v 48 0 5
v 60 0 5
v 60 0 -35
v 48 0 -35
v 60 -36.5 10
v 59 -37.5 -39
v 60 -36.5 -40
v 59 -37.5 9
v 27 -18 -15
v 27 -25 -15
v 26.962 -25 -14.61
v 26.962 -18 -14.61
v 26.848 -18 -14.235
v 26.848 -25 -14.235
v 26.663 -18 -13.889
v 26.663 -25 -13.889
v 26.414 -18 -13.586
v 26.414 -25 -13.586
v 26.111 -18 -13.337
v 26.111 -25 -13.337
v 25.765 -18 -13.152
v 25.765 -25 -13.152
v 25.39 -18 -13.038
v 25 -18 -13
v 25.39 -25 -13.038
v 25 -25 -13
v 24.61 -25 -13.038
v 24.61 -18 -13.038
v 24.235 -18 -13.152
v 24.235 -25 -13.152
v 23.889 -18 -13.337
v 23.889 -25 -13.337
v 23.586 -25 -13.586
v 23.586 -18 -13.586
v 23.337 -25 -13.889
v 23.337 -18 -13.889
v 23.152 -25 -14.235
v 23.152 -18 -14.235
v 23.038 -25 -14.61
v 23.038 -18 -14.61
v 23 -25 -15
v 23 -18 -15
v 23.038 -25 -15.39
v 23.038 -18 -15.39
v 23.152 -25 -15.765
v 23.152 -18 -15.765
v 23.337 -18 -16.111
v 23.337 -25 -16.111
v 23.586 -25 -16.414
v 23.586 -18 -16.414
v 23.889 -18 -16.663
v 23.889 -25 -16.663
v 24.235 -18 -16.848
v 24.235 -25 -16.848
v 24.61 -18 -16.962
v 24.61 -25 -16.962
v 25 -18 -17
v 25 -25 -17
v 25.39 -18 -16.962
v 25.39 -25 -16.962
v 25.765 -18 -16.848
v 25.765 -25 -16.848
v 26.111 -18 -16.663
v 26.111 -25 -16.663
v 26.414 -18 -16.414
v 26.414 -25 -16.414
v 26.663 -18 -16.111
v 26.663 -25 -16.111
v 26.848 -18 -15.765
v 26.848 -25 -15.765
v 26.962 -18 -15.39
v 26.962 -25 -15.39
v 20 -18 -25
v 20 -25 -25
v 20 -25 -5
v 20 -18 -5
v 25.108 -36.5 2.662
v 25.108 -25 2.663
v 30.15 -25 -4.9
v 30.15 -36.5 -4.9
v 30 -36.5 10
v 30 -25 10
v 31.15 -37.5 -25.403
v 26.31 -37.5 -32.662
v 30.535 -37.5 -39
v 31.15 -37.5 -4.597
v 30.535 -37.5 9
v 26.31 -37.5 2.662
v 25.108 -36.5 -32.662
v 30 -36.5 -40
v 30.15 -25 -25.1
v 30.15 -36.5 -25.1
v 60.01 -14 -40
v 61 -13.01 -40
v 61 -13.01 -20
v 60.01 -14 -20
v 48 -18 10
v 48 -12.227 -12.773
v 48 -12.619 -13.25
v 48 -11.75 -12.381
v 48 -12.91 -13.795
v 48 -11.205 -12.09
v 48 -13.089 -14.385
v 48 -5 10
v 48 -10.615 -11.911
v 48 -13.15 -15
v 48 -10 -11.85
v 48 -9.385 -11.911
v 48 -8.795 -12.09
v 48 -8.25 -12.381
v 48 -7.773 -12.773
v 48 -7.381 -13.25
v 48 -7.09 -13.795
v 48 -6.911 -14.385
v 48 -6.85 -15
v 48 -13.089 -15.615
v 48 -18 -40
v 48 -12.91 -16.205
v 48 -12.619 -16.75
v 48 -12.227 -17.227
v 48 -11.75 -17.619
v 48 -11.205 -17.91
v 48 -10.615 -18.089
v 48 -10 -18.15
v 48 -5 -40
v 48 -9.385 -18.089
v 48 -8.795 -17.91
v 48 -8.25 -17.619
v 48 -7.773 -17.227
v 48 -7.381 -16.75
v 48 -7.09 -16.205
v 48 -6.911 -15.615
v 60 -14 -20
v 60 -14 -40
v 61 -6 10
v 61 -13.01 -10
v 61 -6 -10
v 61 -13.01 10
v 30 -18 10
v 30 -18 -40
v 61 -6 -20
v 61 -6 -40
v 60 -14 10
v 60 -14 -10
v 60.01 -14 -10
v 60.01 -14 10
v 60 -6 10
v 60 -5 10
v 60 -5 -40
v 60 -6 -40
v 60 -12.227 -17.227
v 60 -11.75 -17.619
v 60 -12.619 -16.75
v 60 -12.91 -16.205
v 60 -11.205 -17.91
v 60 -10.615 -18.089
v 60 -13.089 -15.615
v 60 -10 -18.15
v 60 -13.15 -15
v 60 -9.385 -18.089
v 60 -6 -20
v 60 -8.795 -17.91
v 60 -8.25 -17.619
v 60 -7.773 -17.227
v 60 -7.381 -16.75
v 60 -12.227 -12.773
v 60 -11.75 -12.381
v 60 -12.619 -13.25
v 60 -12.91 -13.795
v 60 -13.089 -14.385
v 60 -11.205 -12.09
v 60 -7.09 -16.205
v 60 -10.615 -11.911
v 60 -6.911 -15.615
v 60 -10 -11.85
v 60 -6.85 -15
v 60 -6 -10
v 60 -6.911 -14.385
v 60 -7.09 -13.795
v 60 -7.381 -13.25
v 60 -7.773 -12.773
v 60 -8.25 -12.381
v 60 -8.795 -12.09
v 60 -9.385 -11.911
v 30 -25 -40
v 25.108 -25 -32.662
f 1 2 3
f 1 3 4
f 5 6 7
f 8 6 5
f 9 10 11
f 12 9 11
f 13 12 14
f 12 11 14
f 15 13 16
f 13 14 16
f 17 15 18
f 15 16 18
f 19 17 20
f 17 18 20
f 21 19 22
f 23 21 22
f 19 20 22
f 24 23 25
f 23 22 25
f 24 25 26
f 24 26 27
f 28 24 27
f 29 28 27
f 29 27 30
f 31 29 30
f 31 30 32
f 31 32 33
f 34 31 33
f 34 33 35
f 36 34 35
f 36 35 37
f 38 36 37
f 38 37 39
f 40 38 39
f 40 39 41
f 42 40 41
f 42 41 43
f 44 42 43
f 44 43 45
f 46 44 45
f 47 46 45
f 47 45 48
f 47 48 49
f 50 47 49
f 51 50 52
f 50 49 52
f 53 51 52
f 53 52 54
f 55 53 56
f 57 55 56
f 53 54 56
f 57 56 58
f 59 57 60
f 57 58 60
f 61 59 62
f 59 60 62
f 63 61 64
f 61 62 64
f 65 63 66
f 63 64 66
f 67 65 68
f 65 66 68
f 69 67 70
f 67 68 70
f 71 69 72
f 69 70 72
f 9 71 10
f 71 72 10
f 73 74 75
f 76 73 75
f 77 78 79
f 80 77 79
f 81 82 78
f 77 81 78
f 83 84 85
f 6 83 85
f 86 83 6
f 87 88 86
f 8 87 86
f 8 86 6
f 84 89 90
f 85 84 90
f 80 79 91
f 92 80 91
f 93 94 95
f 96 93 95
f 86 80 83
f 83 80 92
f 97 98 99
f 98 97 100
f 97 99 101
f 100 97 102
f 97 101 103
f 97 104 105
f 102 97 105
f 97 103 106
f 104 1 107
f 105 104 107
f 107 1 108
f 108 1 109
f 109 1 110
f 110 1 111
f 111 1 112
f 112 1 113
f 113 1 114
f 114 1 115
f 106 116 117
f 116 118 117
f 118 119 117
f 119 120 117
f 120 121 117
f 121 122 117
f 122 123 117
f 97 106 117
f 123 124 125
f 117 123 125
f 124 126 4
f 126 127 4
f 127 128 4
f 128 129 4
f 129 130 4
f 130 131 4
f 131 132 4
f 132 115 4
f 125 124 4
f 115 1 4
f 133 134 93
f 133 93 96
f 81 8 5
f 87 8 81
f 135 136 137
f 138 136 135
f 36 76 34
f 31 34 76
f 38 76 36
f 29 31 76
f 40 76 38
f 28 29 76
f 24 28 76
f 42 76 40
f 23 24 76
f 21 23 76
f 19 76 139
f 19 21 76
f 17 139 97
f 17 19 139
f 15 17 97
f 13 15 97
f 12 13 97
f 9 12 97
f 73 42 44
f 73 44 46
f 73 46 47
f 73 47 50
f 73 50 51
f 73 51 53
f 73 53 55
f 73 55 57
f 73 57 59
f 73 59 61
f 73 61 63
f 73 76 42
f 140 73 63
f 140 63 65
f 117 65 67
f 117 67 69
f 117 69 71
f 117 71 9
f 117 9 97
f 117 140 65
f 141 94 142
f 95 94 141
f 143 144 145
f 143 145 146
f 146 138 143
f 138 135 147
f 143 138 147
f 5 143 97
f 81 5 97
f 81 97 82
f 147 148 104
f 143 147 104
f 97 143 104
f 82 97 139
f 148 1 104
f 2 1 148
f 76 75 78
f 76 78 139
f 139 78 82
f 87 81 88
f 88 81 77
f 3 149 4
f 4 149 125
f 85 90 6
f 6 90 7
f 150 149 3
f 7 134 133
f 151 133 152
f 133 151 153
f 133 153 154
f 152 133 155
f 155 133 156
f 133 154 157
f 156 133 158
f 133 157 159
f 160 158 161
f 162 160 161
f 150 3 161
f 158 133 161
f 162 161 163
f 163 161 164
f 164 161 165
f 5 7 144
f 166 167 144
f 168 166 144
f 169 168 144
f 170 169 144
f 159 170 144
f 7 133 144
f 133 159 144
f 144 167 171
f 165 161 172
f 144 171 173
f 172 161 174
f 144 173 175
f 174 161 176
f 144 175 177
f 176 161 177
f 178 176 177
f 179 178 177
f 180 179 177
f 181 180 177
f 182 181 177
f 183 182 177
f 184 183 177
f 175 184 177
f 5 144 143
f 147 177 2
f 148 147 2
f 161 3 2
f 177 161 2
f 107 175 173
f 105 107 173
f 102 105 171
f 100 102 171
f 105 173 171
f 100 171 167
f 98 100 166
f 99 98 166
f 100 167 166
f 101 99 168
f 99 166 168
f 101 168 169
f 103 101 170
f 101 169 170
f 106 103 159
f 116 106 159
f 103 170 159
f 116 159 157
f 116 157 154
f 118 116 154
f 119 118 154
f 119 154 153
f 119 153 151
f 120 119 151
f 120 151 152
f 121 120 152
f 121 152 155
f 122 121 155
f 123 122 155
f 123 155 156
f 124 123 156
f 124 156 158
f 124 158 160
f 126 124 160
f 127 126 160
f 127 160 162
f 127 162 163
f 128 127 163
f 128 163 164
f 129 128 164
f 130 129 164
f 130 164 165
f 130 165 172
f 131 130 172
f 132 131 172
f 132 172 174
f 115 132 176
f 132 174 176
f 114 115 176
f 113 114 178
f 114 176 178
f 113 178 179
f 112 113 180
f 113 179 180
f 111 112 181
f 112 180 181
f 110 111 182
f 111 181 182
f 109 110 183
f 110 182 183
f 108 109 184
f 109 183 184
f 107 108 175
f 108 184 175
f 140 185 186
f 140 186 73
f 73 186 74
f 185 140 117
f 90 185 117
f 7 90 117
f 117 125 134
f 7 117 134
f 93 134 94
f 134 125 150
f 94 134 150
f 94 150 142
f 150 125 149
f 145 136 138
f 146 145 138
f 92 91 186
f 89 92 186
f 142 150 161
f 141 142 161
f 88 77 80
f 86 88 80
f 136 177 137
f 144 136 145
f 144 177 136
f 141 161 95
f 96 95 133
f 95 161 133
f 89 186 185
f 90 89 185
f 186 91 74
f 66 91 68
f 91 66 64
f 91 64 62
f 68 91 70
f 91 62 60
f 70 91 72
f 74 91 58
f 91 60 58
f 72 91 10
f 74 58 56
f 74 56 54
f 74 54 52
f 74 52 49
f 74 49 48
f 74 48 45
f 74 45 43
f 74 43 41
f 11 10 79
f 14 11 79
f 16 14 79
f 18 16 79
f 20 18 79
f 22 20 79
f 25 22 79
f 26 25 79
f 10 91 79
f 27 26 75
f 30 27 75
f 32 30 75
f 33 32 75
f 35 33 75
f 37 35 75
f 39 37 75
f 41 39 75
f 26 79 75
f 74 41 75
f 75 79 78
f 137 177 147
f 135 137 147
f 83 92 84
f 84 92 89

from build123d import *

# Parameters (mm, degrees)
SKETCH047_R     = 2
PAD012_DEPTH    = 25
SKETCH048_R     = 3.15
POCKET030_DEPTH = 40.001
SKETCH049_W     = 28
SKETCH049_H     = 50
POCKET031_DEPTH = 18
PAD013_DEPTH    = 12.5
SKETCH051_W     = 20
SKETCH051_H     = 8
PAD014_DEPTH    = 1
CHAMFER009_SIZE = 0.99
CHAMFER010_SIZE = 1
CHAMFER011_SIZE = 5


with BuildPart() as part:
    # Sketch047 → Pad012 (new body)
    with BuildSketch(Plane.XZ):
        Polygon((0, 0), (-30, 0), (-40, 15), (-40, 35), (-30, 50), (0, 50), align=None)
        with Locations((-35, 25)):
            Circle(SKETCH047_R, mode=Mode.SUBTRACT)
    extrude(amount=-PAD012_DEPTH)

    # Sketch048 (on Face6 of Pad012) → Pocket030 (cut, through all)
    with BuildSketch(Plane(origin=(0, 0, 0), x_dir=(0, 0, 1), z_dir=(1, 0, 0))):
        with Locations((25, -15)):
            Circle(SKETCH048_R)
    extrude(amount=-POCKET030_DEPTH, mode=Mode.SUBTRACT)

    # Sketch049 (on Face5 of Pocket030) → Pocket031 (cut)
    with BuildSketch(Plane(origin=(0, 25, 0), x_dir=(1, 0, 0), z_dir=(0, 1, 0))):
        with Locations((-26, -25)):
            Rectangle(SKETCH049_W, SKETCH049_H)
    extrude(amount=-POCKET031_DEPTH, mode=Mode.SUBTRACT)

    # Sketch050 (on Face2 of Pocket031) → Pad013 (join)
    with BuildSketch(Plane.XZ):
        Polygon((-34.891667, 42.6625), (-29.85, 35.1), (-29.85, 14.9), (-34.891667, 7.3375), (-30, 0), (0, 0), (0, 50), (-30, 50), align=None)
    extrude(amount=PAD013_DEPTH)

    # Sketch051 (on Face14 of Pad013) → Pad014 (join)
    with BuildSketch(Plane(origin=(0, 0, 0), x_dir=(0, 0, 1), z_dir=(1, 0, 0))):
        with Locations((10, -15)):
            Rectangle(SKETCH051_W, SKETCH051_H)
        with Locations((40, -15)):
            Rectangle(SKETCH051_W, SKETCH051_H)
    extrude(amount=PAD014_DEPTH)

    # Chamfer009
    chamfer009_edges = [part.edges().sort_by_distance(p)[0] for p in [
        (1, 11, 40),
        (1, 11, 10),
    ]]
    chamfer(chamfer009_edges, length=CHAMFER009_SIZE)

    # Chamfer010
    chamfer010_edges = [part.edges().sort_by_distance(p)[0] for p in [
        (-32.370833, -12.5, 38.88125),
        (-29.85, -12.5, 25),
        (-32.370833, -12.5, 11.11875),
        (-32.445833, -12.5, 3.66875),
        (-15, -12.5, 0),
        (0, -12.5, 25),
        (-15, -12.5, 50),
        (-32.445833, -12.5, 46.33125),
    ]]
    chamfer(chamfer010_edges, length=CHAMFER010_SIZE)

    # Chamfer011
    chamfer011_edges = [part.edges().sort_by_distance(p)[0] for p in [
        (-6, 25, 50),
        (-6, 25, 0),
    ]]
    chamfer(chamfer011_edges, length=CHAMFER011_SIZE)


with BuildPart() as part_1:
    # Body004 placement: moved
    add(part.part.moved(Location((60, -25, -40))))


solid = part_1.part
